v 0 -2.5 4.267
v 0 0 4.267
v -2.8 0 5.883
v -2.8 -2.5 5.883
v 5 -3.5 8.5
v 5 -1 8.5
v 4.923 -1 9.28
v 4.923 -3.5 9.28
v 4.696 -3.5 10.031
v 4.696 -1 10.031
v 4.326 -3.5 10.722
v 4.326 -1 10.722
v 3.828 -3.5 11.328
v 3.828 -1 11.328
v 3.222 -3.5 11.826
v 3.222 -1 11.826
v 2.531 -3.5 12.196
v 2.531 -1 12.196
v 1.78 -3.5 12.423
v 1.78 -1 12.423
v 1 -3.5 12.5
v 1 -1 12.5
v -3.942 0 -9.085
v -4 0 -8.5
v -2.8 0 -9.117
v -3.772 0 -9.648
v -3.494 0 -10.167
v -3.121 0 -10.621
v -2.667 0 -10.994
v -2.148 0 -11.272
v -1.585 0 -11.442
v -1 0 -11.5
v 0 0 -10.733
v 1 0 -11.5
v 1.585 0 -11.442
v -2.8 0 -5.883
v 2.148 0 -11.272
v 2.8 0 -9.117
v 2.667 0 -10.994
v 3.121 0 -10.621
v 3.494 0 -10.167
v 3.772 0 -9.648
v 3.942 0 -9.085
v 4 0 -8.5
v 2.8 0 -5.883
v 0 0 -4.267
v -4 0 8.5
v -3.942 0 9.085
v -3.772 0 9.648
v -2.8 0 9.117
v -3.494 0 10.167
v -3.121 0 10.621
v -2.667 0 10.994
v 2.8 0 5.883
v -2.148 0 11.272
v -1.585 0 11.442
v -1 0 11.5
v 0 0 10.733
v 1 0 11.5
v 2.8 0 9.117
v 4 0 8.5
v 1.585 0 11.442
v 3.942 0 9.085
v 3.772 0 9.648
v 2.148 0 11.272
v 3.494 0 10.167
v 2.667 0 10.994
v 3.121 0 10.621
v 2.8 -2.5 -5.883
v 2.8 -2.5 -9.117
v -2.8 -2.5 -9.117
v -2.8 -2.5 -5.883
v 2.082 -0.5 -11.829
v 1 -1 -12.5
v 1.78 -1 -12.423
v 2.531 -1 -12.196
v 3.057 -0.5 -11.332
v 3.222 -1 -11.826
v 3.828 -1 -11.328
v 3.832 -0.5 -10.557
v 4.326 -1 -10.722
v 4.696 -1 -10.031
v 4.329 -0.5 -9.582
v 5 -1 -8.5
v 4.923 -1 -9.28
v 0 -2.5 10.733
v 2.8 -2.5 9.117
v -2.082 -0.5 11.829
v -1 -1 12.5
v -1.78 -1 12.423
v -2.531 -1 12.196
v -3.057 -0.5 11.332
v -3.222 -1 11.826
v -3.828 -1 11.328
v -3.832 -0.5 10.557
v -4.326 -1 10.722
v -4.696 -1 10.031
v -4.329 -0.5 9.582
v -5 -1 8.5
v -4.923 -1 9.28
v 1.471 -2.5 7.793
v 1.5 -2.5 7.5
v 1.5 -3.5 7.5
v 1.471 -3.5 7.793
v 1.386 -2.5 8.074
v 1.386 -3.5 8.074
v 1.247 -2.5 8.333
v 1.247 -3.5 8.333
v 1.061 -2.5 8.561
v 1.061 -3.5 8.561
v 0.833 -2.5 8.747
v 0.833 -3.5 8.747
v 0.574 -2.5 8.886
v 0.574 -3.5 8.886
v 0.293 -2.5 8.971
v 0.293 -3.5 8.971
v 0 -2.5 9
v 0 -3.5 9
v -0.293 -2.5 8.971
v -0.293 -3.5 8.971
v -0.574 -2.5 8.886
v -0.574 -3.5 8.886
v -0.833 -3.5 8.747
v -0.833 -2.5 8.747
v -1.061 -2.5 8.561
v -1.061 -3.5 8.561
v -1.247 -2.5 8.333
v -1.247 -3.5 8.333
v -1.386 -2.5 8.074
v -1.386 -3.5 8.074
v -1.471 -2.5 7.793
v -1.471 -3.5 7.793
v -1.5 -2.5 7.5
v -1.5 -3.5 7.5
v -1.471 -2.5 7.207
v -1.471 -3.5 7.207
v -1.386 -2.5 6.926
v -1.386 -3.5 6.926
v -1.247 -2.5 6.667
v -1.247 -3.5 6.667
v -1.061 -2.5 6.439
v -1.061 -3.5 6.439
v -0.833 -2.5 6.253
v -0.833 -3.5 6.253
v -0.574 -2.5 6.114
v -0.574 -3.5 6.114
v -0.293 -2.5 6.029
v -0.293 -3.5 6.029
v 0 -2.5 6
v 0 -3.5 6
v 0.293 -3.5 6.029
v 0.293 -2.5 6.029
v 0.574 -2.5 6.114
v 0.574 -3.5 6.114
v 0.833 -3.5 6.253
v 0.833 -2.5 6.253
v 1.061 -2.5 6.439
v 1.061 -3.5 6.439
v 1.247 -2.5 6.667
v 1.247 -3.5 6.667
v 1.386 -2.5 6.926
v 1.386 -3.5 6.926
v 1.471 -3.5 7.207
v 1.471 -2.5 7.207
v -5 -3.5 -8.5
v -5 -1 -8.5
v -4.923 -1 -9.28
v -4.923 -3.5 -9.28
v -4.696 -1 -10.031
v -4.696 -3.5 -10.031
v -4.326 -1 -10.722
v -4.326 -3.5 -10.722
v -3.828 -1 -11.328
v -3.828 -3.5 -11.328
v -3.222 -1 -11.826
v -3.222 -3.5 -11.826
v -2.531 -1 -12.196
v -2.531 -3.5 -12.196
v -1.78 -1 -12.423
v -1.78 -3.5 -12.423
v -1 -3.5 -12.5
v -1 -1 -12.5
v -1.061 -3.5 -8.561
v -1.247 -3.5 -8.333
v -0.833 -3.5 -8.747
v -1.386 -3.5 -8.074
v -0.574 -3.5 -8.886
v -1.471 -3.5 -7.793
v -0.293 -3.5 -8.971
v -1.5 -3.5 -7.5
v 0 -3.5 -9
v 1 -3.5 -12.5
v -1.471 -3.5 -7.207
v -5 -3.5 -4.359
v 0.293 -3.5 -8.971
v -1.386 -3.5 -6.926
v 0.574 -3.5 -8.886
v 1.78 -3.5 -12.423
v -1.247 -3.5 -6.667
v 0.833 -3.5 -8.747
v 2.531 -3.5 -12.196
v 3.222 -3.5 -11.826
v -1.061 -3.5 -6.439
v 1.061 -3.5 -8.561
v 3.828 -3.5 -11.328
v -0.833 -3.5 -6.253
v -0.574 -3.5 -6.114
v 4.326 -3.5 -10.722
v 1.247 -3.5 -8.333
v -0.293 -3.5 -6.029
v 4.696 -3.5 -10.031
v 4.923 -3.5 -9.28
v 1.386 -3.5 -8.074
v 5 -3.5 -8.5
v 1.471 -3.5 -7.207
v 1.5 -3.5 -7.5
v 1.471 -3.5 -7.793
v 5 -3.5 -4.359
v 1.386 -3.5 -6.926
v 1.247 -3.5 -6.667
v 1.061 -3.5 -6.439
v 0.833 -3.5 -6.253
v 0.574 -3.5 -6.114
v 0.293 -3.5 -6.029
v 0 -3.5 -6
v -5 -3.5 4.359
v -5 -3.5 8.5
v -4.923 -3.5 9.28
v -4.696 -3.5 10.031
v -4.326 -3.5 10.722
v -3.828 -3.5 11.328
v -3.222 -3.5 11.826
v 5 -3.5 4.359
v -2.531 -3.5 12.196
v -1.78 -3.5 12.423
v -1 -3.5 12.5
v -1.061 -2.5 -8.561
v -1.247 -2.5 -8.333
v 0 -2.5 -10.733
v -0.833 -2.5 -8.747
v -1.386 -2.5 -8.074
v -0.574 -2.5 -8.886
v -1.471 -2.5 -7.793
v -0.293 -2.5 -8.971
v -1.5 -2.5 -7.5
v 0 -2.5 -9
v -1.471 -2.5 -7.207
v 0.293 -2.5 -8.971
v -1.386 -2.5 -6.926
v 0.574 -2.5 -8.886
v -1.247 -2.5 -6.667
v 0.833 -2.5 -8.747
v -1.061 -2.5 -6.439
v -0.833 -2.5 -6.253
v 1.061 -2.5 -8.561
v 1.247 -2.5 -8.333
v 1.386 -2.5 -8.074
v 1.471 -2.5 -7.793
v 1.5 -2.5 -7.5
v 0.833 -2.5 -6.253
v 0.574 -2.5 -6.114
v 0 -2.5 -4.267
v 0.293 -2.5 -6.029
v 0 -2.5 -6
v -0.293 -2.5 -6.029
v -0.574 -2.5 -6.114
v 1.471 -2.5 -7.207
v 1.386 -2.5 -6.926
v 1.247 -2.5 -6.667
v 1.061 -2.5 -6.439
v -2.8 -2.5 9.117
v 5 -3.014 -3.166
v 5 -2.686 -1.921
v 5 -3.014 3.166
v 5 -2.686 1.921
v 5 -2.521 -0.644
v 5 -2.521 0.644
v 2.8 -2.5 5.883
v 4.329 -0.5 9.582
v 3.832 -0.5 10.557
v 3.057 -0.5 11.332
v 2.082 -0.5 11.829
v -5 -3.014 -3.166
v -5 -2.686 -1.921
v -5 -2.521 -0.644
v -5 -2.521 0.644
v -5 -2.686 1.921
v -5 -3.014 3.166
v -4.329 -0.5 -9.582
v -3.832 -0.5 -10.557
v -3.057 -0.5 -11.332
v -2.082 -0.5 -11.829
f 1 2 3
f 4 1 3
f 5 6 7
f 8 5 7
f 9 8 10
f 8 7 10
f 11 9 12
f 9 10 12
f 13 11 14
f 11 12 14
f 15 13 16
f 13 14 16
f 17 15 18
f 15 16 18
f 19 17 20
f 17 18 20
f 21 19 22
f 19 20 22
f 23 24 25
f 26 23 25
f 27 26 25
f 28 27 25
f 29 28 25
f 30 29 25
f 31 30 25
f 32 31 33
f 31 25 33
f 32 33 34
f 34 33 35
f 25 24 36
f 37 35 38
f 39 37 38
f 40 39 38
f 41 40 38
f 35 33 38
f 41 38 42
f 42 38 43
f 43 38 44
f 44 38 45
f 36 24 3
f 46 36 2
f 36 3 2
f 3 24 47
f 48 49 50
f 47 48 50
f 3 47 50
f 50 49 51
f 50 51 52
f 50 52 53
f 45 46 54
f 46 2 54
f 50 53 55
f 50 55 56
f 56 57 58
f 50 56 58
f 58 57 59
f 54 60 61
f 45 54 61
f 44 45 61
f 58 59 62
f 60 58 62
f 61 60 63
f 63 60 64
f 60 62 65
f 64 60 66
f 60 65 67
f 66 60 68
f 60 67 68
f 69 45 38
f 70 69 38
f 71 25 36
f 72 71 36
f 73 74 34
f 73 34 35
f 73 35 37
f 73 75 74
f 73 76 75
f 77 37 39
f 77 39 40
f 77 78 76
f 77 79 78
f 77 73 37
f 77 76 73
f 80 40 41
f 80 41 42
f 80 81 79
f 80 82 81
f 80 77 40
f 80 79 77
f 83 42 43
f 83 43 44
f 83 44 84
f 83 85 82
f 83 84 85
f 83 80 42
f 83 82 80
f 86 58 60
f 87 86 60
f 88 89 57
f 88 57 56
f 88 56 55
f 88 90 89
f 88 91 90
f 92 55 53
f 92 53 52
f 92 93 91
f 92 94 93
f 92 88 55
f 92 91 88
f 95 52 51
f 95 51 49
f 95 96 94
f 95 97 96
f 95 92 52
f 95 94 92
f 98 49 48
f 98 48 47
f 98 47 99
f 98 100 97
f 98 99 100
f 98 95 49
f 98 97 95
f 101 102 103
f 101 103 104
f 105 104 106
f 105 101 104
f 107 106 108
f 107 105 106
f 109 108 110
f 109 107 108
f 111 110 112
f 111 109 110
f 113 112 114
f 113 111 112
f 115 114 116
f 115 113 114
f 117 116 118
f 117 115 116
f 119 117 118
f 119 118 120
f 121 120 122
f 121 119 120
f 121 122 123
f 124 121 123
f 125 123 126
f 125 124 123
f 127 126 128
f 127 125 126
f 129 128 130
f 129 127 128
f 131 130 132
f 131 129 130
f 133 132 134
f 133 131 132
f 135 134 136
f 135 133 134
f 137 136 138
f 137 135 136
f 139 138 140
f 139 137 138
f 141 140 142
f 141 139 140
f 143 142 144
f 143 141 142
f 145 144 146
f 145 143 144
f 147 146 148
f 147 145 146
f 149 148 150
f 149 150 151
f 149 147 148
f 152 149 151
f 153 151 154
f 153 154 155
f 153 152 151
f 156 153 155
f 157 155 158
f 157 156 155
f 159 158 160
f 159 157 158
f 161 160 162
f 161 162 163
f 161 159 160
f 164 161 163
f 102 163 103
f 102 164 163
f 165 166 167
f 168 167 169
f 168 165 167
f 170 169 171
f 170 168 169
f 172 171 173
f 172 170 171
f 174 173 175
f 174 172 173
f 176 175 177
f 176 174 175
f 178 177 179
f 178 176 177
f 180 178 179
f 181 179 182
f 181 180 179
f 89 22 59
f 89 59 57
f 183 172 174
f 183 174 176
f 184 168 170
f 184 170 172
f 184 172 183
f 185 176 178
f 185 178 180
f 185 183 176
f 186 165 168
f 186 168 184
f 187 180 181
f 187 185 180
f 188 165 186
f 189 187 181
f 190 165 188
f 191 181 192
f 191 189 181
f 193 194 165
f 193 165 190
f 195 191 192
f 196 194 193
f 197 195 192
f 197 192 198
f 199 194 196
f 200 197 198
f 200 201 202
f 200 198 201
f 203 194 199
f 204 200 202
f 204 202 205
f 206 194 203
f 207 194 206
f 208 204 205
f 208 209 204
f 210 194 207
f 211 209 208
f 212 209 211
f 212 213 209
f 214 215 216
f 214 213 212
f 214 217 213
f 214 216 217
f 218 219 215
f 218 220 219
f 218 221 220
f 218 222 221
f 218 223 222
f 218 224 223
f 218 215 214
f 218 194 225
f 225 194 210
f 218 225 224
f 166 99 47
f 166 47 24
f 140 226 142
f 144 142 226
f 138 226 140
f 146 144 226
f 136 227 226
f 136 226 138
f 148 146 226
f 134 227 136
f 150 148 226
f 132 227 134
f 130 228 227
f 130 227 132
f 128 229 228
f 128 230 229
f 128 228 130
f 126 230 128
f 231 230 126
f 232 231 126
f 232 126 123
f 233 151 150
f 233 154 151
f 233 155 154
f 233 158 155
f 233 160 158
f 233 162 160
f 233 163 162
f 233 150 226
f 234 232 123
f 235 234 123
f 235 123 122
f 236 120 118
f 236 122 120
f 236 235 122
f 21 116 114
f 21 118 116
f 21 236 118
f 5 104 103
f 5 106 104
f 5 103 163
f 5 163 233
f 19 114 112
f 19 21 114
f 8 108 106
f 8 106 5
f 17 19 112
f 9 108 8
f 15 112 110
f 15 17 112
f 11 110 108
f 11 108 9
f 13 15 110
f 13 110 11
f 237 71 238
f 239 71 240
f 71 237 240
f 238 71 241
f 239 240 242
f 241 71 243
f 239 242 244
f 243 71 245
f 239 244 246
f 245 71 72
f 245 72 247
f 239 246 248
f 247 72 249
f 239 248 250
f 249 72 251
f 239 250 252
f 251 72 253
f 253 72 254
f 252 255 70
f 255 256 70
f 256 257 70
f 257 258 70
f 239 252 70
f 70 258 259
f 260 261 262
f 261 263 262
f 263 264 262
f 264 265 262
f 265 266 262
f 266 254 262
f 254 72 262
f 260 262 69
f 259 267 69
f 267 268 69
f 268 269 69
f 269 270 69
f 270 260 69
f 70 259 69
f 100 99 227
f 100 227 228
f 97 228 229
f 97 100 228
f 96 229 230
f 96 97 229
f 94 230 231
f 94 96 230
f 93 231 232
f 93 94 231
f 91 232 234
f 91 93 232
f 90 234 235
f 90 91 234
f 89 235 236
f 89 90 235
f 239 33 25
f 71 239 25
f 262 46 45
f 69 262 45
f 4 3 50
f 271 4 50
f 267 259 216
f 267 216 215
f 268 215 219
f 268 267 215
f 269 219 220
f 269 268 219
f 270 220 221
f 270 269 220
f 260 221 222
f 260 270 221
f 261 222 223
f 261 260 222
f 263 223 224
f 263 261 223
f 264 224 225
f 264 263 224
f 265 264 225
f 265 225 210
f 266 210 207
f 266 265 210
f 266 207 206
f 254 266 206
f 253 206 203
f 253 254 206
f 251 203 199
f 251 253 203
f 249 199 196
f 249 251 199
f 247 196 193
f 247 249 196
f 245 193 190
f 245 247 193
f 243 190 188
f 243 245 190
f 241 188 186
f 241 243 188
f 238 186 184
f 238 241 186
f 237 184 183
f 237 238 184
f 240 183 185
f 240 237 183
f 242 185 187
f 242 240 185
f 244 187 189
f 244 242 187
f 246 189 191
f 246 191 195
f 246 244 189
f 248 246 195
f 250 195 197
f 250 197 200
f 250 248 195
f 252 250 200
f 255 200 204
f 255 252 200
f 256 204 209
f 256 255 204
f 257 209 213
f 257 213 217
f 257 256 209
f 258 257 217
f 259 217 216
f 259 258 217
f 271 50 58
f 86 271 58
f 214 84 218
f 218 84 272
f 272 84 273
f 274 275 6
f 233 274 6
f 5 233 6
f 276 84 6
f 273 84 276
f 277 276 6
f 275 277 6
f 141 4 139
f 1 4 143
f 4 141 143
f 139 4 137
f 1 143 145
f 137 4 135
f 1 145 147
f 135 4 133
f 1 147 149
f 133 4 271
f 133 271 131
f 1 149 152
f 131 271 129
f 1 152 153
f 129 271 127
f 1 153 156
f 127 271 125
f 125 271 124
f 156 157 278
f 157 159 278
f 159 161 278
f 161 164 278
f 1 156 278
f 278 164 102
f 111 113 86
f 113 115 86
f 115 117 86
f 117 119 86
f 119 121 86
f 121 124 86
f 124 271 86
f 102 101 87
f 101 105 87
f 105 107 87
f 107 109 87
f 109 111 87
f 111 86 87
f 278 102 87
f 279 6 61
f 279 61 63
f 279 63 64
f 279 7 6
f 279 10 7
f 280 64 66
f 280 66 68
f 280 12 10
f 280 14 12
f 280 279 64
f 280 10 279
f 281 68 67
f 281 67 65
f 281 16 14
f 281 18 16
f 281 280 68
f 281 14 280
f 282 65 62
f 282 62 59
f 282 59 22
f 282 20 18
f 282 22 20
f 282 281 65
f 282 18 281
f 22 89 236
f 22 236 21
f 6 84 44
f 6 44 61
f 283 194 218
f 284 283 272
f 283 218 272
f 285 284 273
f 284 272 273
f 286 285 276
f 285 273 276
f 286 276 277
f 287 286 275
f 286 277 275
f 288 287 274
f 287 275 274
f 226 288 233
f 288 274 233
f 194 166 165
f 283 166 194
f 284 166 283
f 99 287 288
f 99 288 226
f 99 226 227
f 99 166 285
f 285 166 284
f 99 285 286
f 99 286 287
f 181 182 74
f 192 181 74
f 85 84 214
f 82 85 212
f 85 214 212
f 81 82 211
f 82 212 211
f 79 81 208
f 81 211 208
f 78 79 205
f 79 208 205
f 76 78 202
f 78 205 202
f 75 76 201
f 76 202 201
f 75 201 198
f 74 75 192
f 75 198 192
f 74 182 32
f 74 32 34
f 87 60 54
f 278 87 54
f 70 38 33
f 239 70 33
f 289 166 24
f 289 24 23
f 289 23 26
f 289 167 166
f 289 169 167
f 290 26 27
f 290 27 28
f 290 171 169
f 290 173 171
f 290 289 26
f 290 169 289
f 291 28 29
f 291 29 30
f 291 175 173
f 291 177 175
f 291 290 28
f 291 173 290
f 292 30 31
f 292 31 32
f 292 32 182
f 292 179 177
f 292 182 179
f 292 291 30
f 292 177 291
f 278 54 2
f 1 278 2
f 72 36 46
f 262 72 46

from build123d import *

# Parameters (mm, degrees)
F0_W     = 10
F0_H     = 25
F1_DEPTH = 2.5
F2_W     = 10
F2_H     = 25
F2_R     = 1.5
F3_DEPTH = 1
F4_R     = 10
F5_DEPTH = 25
F6_R     = 4
F7_SIZE  = 1


with BuildPart() as f1:
    # F0 (on Front) → F1 (new body)
    with BuildSketch(Plane.XZ):
        Rectangle(F0_W, F0_H)
        Polygon((0, -4.266838), (2.8, -5.883419), (2.8, -9.116581), (0, -10.733162), (-2.8, -9.116581), (-2.8, -5.883419), align=None, mode=Mode.SUBTRACT)
        Polygon((2.8, 5.883419), (0, 4.266838), (-2.8, 5.883419), (-2.8, 9.116581), (0, 10.733162), (2.8, 9.116581), align=None, mode=Mode.SUBTRACT)
    extrude(amount=F1_DEPTH)

    # F2 (on face) → F3 (join)
    with BuildSketch(Plane.XZ.offset(2.5)):
        Rectangle(F2_W, F2_H)
        Polygon((-2.8, -5.883419), (0, -4.266838), (2.8, -5.883419), (2.8, -9.116581), (0, -10.733162), (-2.8, -9.116581), align=None, mode=Mode.SUBTRACT)
        Polygon((-2.8, 9.116581), (0, 10.733162), (2.8, 9.116581), (2.8, 5.883419), (0, 4.266838), (-2.8, 5.883419), align=None, mode=Mode.SUBTRACT)
        Polygon((2.8, 9.116581), (0, 10.733162), (-2.8, 9.116581), (-2.8, 5.883419), (0, 4.266838), (2.8, 5.883419), align=None)
        with Locations((0, 7.5)):
            Circle(F2_R, mode=Mode.SUBTRACT)
        Polygon((2.8, -5.883419), (0, -4.266838), (-2.8, -5.883419), (-2.8, -9.116581), (0, -10.733162), (2.8, -9.116581), align=None)
        with Locations((0, -7.5)):
            Circle(F2_R, mode=Mode.SUBTRACT)
    extrude(amount=F3_DEPTH)

    # F4 (on face) → F5 (cut)
    with BuildSketch(Plane.YZ.offset(5)):
        with Locations((-12.5, 0)):
            Circle(F4_R)
    extrude(amount=-F5_DEPTH, mode=Mode.SUBTRACT)

    # F6
    f6_edges = [f1.edges().sort_by_distance(p)[0] for p in [
        (5, -1.75, 12.5),
        (-5, -1.75, 12.5),
        (-5, -1.75, -12.5),
        (5, -1.75, -12.5),
    ]]
    fillet(f6_edges, radius=F6_R)

    # F7
    f7_edges = [f1.edges().sort_by_distance(p)[0] for p in [
        (5, 0, 0),
    ]]
    chamfer(f7_edges, length=F7_SIZE)


solid = f1.part
